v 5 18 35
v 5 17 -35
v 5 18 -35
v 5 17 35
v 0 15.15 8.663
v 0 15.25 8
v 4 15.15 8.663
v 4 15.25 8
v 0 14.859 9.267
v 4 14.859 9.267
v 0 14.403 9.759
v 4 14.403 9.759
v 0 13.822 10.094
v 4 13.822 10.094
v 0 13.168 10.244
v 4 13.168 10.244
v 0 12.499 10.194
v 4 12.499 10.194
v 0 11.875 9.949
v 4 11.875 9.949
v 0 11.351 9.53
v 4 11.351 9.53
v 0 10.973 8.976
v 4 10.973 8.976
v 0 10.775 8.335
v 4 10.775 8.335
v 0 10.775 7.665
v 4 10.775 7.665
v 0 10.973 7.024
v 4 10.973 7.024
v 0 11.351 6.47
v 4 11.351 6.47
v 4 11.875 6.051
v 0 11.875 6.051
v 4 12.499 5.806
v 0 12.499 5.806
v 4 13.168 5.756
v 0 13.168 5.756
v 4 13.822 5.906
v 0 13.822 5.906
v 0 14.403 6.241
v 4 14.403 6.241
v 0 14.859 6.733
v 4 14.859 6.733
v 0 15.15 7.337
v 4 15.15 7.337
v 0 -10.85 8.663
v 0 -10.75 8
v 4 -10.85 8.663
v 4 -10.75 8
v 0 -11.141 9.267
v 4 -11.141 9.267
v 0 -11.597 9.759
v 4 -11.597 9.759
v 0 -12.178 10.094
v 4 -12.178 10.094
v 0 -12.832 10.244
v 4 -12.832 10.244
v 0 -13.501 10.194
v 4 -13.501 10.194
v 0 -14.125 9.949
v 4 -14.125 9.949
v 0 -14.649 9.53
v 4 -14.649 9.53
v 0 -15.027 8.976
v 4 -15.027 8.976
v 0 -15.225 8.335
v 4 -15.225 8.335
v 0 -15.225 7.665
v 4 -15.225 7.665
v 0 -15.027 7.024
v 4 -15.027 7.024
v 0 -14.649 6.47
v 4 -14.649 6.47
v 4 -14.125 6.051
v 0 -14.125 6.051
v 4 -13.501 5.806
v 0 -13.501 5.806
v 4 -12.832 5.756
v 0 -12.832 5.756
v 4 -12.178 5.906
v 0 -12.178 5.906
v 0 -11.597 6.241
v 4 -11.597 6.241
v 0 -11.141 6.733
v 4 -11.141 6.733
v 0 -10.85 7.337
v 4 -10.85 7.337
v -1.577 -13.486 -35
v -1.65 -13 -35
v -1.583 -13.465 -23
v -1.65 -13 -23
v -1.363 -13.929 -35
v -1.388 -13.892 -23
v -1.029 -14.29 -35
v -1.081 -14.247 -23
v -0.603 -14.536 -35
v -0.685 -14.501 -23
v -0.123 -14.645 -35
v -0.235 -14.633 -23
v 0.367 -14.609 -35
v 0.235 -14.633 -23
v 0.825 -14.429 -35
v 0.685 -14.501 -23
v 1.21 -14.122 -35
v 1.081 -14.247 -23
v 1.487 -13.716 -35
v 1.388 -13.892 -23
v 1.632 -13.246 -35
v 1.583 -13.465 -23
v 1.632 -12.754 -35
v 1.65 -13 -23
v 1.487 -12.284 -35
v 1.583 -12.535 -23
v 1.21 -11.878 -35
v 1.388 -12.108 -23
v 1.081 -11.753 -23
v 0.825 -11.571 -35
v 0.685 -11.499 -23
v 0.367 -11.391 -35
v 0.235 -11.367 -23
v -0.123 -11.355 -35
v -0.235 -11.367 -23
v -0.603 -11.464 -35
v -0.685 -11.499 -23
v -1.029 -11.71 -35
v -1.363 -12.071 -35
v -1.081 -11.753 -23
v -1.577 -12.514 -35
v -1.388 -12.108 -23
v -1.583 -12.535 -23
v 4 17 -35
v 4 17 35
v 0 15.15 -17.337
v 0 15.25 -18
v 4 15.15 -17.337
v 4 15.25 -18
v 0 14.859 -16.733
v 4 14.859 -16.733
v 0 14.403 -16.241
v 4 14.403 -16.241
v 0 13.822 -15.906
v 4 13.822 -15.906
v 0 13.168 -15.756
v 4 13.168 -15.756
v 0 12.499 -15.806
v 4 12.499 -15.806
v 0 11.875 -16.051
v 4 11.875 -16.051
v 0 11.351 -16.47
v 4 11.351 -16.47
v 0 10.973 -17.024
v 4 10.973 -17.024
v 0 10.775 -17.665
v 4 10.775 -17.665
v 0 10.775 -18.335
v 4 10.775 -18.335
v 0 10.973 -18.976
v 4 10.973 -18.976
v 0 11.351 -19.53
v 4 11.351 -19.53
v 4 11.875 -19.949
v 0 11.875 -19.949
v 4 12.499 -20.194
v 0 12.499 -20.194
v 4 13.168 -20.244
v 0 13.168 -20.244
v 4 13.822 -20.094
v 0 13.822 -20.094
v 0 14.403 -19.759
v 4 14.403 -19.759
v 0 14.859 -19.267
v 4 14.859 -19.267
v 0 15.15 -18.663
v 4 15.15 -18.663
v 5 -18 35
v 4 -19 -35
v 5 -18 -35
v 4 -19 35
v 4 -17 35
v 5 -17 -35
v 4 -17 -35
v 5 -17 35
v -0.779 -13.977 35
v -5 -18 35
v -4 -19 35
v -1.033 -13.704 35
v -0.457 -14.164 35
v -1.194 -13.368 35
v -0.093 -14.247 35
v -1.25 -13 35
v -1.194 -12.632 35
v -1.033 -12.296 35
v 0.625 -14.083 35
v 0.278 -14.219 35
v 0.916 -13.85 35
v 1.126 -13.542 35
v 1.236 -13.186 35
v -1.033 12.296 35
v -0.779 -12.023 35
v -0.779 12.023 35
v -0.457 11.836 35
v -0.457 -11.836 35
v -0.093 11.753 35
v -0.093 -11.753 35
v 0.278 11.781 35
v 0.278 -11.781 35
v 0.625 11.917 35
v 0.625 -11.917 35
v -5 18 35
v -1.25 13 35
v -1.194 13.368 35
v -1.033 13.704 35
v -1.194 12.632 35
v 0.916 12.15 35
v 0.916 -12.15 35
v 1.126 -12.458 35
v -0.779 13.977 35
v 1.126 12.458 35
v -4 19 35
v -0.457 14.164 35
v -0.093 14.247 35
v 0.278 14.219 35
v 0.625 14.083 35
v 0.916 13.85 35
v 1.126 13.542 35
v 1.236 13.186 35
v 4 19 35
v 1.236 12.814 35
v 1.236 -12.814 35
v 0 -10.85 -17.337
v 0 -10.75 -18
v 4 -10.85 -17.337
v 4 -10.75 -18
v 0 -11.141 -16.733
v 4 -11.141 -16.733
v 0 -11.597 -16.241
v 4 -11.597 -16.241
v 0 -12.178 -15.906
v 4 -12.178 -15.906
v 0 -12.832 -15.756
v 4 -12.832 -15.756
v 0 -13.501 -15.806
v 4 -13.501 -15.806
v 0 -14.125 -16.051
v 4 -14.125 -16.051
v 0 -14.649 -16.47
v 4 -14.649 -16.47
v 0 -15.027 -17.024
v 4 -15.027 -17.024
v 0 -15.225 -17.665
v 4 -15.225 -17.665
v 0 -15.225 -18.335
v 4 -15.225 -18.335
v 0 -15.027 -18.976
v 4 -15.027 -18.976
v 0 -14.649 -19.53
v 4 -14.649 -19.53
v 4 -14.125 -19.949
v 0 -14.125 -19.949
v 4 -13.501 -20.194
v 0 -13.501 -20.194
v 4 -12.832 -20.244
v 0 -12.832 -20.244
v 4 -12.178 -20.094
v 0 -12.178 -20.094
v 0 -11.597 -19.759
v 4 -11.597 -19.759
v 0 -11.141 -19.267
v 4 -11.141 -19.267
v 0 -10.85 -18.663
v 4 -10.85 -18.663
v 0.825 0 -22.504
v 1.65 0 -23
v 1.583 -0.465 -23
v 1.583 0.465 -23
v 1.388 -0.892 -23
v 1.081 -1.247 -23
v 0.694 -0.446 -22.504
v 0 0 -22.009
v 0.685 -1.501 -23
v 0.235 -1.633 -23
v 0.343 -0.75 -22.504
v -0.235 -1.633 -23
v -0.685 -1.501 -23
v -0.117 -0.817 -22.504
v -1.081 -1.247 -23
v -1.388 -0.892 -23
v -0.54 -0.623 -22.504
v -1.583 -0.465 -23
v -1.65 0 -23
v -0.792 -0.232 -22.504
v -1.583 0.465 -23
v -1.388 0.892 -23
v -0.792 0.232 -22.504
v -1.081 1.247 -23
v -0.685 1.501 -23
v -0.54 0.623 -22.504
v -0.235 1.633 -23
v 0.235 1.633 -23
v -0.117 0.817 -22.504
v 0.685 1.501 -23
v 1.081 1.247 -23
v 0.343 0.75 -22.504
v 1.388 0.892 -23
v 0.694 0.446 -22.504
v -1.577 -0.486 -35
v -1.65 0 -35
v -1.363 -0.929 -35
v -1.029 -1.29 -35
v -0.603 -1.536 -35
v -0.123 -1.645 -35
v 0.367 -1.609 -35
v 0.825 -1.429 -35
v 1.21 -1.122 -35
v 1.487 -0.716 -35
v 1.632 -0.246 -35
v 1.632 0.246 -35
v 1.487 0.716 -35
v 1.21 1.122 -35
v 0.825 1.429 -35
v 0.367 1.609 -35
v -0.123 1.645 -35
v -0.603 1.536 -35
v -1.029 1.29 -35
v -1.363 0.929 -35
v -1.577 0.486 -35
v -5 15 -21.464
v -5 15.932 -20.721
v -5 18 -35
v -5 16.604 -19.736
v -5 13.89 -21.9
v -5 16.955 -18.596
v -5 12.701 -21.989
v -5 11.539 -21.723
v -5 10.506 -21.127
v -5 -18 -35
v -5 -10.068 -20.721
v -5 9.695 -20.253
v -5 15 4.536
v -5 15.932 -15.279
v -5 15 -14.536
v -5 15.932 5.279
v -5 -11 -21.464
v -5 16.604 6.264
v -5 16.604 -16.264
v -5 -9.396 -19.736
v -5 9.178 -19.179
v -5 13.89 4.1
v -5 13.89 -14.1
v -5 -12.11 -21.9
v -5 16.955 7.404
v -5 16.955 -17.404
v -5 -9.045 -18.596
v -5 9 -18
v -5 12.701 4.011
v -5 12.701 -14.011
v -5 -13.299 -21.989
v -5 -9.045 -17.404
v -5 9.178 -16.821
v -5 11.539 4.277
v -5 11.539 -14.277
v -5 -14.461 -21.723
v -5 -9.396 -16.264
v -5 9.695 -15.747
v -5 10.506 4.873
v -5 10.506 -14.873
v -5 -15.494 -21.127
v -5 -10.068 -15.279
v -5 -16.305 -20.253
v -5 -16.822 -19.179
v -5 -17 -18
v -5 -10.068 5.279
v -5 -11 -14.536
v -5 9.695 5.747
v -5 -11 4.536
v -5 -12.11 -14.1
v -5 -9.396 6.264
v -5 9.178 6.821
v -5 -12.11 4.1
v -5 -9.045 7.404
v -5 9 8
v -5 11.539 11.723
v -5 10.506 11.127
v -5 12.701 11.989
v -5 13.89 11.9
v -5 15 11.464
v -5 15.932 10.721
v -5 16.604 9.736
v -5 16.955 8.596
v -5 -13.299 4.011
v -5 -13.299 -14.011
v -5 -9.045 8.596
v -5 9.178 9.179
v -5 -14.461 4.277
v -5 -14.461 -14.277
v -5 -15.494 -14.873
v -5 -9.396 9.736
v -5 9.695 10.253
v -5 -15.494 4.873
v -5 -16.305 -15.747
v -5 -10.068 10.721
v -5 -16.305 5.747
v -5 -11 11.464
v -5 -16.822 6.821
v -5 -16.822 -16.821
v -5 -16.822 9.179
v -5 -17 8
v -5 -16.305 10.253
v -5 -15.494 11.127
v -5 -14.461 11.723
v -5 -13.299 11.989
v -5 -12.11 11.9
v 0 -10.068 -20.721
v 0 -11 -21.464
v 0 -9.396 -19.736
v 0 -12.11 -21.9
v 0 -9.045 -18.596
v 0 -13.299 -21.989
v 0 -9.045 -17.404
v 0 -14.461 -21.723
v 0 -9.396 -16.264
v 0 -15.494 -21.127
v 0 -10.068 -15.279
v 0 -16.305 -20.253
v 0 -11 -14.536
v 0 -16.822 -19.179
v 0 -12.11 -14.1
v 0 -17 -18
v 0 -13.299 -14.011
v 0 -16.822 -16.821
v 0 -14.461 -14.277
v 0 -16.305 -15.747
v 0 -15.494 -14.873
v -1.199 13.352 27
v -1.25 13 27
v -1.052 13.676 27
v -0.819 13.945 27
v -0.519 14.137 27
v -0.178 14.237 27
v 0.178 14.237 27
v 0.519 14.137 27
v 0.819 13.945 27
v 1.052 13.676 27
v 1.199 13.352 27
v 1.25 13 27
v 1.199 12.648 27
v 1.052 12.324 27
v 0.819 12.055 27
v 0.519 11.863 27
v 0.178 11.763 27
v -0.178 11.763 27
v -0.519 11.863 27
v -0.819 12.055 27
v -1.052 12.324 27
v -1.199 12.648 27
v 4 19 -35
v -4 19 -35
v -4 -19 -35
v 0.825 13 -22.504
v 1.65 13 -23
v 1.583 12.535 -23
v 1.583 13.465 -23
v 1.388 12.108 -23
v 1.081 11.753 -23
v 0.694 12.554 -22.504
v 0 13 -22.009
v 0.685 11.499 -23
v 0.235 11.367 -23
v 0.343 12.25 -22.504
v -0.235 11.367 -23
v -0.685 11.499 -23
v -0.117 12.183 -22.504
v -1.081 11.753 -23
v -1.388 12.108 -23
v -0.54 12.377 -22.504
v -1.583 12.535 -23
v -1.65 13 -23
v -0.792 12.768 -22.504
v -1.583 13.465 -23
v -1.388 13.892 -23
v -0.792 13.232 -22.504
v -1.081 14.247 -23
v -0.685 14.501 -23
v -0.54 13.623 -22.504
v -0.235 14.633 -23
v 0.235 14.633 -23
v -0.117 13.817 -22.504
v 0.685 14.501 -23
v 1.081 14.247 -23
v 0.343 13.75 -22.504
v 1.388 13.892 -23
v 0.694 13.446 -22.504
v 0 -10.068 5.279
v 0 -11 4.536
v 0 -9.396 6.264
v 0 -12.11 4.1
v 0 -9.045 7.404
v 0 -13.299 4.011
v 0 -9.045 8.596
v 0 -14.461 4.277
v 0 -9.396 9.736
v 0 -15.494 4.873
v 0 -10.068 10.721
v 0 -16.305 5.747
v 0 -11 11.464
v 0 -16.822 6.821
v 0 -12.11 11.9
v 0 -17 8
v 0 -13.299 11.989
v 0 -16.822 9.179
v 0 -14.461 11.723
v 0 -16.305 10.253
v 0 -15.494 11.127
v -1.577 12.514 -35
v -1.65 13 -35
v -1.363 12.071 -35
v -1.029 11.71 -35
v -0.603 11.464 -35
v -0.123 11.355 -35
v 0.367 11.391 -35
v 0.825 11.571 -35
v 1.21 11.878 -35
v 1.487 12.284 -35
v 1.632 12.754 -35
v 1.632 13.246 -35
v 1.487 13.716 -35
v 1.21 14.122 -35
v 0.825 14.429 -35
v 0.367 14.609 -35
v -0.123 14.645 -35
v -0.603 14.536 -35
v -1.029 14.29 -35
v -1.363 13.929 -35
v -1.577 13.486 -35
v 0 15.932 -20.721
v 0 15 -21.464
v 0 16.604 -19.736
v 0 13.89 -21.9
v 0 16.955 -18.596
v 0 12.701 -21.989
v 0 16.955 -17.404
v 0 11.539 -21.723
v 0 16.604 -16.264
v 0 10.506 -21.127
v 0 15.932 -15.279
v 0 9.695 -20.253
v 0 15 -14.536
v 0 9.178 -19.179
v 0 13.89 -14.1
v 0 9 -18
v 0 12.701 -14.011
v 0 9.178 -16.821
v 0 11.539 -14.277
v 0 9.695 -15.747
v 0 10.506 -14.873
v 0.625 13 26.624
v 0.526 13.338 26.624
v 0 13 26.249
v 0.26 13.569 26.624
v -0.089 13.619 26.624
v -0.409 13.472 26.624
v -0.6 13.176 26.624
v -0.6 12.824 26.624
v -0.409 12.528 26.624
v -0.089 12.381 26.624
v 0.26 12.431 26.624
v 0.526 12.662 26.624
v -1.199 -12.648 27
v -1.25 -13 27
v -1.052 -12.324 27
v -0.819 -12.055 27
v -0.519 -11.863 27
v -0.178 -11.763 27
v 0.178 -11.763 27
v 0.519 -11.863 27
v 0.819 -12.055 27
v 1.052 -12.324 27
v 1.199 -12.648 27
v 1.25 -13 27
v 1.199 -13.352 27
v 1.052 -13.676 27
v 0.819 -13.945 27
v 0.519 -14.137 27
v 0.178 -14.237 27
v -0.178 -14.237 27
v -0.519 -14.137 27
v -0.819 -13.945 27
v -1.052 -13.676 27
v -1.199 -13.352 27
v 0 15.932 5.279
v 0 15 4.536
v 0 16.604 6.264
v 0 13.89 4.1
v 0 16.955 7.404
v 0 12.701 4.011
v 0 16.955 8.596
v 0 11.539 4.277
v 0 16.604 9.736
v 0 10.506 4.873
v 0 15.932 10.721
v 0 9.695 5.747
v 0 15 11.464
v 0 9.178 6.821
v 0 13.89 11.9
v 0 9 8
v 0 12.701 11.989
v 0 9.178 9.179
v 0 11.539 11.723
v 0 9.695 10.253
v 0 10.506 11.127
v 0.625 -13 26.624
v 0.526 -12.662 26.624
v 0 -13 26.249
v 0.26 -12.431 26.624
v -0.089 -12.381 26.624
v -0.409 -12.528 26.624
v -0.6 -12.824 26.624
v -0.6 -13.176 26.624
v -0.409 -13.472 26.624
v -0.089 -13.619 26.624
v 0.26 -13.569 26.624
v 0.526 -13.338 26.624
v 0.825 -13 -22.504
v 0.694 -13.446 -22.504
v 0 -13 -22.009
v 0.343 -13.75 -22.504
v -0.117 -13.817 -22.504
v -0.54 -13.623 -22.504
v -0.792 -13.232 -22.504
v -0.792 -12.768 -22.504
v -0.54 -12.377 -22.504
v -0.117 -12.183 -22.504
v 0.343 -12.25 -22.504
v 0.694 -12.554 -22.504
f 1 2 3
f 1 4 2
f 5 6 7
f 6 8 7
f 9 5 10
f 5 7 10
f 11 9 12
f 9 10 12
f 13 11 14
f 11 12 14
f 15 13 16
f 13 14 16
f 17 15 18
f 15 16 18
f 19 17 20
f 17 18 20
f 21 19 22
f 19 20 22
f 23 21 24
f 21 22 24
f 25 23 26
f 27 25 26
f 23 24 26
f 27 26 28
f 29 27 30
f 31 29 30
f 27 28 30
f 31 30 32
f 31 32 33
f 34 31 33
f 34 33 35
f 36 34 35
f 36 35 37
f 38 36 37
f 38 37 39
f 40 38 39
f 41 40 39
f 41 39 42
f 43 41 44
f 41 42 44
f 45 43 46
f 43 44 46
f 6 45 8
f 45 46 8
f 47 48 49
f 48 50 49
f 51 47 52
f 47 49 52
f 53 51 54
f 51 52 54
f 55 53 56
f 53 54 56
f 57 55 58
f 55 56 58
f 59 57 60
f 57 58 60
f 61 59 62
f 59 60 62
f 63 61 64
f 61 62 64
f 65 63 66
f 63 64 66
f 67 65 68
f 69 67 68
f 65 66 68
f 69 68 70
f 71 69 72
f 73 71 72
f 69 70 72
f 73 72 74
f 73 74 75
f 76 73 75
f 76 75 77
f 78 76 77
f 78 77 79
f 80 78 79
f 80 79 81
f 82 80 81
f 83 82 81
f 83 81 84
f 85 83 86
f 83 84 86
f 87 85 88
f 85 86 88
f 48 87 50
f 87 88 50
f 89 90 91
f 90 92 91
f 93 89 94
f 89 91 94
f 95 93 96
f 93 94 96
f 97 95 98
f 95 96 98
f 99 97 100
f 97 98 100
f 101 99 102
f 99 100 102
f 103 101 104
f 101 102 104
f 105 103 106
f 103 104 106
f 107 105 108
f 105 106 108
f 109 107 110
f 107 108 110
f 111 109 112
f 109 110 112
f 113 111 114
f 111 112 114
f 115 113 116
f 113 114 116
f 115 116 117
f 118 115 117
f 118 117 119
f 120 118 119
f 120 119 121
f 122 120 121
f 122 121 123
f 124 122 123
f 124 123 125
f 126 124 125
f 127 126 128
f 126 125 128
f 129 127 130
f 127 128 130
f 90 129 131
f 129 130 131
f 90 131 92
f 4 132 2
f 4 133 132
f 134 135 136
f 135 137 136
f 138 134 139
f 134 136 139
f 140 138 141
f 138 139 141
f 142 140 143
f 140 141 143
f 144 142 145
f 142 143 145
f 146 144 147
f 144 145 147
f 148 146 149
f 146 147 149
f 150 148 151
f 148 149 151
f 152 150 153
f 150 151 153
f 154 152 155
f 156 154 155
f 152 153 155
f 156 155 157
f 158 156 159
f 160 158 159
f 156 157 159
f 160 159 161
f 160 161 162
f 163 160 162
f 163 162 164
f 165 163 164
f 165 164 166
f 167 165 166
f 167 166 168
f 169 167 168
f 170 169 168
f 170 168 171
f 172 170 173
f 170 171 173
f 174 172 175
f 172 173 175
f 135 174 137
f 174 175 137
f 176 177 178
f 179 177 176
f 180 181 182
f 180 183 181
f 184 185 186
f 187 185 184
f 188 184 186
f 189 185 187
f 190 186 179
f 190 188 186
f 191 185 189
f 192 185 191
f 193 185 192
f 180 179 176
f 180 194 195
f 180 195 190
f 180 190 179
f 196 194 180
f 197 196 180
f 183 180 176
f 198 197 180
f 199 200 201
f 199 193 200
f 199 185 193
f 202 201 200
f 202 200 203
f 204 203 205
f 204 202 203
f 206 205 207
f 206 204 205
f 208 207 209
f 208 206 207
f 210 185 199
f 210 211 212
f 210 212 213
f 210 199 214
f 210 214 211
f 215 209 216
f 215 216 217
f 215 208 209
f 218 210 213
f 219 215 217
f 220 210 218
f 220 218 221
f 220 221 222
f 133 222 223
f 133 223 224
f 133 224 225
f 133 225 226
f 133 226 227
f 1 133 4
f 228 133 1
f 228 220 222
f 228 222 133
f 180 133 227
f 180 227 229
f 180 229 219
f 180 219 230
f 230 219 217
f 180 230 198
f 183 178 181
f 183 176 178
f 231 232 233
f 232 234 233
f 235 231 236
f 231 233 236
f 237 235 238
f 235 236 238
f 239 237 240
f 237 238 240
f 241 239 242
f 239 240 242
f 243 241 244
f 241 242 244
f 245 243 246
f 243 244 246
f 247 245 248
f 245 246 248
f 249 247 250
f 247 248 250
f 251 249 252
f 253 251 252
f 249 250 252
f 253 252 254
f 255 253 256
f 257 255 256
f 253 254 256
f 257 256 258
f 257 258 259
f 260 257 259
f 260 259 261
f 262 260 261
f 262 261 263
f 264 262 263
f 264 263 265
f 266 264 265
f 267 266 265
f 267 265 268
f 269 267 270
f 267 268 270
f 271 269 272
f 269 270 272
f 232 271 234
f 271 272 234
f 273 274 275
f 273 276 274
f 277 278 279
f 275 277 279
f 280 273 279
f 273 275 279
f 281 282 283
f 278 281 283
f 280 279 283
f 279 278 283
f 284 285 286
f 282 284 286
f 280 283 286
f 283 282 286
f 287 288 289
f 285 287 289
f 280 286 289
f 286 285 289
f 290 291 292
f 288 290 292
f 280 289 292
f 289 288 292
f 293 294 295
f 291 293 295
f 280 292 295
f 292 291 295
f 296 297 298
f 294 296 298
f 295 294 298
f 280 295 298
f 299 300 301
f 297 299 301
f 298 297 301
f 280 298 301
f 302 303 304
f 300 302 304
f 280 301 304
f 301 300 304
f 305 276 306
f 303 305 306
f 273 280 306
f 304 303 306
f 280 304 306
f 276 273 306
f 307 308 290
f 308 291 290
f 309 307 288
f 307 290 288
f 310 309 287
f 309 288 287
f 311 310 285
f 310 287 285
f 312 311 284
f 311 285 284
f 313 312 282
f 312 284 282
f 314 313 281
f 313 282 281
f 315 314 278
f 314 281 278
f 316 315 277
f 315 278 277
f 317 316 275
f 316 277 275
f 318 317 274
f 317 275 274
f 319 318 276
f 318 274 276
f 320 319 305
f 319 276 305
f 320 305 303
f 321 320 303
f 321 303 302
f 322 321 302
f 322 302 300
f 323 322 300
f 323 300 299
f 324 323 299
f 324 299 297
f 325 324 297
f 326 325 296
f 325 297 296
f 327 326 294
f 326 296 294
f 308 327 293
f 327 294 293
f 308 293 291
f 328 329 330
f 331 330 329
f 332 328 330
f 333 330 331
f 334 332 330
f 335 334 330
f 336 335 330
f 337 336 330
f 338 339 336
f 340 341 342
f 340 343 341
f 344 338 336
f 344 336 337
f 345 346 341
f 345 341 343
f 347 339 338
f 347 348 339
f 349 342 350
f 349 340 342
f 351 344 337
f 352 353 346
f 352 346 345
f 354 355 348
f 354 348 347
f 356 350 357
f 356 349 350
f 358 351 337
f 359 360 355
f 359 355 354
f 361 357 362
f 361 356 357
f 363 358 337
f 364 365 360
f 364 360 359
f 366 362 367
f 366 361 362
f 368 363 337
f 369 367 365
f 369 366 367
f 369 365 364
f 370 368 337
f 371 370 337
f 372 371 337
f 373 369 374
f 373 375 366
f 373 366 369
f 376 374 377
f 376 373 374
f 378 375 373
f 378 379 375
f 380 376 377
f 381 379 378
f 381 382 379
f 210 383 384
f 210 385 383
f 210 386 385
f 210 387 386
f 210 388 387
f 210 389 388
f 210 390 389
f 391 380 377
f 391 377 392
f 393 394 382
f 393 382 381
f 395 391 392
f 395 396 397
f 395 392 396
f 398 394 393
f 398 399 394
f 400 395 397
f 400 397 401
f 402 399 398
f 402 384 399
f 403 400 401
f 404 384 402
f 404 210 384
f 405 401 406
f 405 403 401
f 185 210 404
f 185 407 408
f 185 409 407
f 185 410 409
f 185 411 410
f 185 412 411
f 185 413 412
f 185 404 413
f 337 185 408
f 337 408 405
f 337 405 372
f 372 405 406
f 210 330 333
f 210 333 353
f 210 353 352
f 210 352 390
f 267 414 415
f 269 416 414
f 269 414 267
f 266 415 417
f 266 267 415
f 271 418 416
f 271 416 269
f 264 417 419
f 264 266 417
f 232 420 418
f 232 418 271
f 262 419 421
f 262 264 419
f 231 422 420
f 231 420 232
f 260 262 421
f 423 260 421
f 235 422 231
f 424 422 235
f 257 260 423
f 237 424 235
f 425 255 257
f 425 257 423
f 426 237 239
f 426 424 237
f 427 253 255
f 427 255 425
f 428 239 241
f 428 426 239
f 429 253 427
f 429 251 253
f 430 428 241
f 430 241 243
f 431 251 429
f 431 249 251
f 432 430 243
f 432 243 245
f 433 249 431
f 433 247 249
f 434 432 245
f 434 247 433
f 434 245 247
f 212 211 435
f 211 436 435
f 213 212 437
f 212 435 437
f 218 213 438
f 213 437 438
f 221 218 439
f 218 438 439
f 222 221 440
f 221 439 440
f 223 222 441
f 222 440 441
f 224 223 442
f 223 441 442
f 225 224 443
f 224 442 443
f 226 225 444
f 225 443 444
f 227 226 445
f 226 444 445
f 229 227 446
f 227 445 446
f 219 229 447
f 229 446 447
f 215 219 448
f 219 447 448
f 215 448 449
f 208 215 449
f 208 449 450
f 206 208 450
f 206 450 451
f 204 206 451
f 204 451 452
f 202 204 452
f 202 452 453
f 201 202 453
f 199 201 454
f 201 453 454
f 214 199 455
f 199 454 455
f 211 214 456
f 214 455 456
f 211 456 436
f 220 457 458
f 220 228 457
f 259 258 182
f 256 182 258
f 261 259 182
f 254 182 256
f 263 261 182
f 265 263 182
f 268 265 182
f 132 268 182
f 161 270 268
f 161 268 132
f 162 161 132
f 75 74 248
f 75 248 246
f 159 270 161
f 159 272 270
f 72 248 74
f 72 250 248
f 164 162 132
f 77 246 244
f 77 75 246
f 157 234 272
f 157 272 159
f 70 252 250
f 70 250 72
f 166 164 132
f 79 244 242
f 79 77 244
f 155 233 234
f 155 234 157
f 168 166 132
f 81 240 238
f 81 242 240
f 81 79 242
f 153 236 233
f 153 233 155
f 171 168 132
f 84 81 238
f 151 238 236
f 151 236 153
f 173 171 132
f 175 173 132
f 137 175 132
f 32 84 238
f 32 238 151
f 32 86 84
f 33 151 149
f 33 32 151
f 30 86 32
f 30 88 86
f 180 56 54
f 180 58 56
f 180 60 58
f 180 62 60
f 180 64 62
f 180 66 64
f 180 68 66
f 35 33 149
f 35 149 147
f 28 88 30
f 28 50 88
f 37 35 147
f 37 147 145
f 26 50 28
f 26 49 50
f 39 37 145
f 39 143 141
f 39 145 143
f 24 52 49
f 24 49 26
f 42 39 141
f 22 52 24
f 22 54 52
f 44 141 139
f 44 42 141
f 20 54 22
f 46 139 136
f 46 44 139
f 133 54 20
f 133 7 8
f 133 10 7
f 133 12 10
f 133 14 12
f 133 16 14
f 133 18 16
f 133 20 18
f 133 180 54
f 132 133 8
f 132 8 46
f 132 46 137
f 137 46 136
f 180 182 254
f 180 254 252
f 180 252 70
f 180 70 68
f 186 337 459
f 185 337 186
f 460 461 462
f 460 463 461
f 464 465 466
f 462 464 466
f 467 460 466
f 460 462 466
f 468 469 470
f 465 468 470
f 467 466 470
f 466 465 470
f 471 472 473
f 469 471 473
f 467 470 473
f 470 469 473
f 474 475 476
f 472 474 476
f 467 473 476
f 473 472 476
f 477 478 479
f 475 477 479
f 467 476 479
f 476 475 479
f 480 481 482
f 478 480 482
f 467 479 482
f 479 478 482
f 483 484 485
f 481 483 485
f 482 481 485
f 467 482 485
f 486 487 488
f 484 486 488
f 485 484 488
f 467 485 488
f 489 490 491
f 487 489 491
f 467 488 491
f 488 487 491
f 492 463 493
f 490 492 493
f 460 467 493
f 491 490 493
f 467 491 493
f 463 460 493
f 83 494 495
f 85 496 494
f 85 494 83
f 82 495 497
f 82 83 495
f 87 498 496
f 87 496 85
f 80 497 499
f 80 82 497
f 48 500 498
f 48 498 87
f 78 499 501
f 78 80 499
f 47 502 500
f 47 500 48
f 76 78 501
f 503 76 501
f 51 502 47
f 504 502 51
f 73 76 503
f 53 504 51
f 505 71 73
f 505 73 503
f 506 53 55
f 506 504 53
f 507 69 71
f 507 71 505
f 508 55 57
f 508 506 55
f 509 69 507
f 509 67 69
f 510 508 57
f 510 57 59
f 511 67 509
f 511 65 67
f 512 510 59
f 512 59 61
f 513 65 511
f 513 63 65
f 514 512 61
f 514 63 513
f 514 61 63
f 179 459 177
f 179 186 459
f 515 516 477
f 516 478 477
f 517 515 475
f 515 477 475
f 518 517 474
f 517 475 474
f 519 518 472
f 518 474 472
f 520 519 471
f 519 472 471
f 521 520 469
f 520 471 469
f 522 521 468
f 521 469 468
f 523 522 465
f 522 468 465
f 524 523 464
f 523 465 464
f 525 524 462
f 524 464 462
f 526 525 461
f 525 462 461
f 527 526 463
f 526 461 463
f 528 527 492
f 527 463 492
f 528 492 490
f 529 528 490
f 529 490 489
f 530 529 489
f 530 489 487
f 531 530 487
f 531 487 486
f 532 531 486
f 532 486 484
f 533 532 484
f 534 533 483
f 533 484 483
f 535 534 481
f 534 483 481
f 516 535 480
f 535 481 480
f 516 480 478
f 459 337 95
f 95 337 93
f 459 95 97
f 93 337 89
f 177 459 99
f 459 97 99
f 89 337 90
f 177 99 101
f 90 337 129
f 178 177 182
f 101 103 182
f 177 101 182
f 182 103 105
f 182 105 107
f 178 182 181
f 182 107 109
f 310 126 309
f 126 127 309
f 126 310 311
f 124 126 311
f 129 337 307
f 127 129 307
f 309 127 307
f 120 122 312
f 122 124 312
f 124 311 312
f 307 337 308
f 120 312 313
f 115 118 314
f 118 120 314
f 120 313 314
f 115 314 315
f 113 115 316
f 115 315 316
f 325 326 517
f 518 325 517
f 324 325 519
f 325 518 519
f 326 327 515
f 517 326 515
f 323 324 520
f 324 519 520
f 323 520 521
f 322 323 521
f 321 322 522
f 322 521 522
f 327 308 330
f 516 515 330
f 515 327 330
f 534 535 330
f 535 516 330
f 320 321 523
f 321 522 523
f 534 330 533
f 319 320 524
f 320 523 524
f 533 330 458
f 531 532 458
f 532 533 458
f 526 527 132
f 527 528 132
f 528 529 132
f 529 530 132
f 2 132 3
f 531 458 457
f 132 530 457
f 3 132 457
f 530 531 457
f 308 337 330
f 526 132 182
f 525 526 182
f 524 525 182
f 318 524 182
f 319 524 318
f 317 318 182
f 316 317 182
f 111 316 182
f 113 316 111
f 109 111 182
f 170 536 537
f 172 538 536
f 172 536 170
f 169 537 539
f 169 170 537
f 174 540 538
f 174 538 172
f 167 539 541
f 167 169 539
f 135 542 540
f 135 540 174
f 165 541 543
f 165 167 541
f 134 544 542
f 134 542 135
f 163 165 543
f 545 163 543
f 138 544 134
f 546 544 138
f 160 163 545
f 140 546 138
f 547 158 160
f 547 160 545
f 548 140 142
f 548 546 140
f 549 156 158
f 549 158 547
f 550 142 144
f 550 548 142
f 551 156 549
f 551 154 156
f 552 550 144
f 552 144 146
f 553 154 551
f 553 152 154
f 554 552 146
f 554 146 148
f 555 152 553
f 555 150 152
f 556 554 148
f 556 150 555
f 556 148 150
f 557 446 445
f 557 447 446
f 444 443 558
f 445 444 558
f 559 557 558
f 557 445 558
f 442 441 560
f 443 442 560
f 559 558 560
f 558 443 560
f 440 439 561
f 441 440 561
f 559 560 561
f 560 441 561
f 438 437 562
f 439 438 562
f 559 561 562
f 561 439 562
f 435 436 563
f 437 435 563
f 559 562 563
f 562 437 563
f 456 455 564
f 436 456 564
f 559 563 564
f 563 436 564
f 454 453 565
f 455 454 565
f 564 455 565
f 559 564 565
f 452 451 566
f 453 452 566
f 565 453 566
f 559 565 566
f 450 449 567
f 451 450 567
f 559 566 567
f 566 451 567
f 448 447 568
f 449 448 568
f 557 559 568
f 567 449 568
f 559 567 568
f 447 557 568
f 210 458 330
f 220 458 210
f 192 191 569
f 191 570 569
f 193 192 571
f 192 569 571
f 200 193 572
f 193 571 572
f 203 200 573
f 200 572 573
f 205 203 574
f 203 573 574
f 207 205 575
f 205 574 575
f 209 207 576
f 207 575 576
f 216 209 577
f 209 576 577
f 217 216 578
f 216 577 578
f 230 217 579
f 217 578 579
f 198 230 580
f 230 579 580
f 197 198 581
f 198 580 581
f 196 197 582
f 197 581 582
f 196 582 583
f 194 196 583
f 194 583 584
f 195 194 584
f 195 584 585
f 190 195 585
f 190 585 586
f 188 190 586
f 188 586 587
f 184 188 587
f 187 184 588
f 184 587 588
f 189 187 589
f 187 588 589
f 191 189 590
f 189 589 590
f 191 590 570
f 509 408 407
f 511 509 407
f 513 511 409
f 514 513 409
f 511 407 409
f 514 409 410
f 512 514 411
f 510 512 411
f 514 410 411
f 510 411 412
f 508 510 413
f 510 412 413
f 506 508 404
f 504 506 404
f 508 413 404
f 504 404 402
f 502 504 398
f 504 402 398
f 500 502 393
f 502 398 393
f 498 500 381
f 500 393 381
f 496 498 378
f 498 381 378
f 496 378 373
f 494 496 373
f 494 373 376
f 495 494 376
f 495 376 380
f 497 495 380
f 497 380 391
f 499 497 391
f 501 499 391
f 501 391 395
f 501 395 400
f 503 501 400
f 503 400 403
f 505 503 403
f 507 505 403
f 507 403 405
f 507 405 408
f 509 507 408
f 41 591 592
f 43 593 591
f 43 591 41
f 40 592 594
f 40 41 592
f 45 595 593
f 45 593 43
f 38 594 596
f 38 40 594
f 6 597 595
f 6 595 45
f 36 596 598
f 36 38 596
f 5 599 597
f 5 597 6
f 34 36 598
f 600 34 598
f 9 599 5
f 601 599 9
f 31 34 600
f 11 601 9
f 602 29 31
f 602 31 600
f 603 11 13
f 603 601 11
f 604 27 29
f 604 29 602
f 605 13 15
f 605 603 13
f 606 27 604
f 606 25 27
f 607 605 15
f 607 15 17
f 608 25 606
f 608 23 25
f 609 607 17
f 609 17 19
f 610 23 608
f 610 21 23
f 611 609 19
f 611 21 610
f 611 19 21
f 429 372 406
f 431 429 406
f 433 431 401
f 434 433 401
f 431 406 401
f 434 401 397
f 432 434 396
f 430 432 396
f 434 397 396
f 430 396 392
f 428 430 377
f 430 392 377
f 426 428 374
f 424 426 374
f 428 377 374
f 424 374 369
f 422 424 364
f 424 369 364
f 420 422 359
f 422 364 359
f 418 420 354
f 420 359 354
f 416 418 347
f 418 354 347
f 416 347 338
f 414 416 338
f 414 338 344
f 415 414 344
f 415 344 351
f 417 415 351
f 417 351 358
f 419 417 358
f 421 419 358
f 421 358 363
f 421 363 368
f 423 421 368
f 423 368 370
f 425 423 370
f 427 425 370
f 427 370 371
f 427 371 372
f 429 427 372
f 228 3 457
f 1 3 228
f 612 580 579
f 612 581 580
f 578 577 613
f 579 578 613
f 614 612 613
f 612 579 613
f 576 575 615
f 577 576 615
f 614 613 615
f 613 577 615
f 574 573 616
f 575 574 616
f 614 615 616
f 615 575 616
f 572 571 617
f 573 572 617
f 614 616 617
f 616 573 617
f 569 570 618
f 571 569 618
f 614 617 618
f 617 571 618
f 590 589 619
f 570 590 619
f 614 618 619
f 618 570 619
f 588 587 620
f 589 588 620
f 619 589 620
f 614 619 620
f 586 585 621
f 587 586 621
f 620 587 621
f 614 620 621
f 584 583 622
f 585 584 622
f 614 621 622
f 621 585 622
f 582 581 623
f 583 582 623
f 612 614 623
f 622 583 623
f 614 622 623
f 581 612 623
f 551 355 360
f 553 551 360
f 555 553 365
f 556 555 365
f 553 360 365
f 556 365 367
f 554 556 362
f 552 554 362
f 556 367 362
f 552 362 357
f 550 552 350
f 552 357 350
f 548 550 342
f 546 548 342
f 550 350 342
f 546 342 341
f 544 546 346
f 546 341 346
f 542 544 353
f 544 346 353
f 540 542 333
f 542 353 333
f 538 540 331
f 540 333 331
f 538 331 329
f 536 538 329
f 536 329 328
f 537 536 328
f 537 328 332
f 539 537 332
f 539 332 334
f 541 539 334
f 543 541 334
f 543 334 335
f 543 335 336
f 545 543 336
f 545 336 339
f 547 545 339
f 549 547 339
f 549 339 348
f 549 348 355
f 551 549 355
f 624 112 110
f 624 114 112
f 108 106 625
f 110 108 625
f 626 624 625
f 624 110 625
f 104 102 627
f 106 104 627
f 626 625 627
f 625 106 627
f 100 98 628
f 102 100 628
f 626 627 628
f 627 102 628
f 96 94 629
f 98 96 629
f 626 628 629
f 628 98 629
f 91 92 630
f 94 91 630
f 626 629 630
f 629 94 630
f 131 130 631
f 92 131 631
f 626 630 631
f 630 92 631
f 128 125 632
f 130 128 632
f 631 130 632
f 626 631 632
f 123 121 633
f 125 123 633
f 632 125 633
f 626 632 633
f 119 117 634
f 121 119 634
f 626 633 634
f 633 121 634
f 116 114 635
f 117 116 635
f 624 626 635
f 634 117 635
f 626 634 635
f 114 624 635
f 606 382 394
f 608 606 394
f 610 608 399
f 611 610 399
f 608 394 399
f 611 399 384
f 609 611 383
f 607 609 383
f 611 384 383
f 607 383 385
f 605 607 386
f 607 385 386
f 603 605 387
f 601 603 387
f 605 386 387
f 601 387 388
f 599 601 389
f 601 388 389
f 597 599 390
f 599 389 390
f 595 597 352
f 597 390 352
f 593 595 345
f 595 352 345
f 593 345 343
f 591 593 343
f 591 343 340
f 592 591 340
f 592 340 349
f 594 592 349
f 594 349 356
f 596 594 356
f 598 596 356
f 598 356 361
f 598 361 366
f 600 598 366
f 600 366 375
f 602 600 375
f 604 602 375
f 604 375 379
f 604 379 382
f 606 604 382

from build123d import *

# Parameters (mm, degrees)
F1_DEPTH       = 35
F2_SIZE        = 1
F4_D           = 2.5
F4_DEPTH       = 8
F4_TIP         = 0.7510757738
F6_D           = 4.5
F6_CBORE_D     = 8
F6_CBORE_DEPTH = 5
F8_D           = 3.3
F8_DEPTH       = 12
F8_TIP         = 0.9914200214


with BuildPart() as f1:
    # F0 (on Top) → F1 (new body, symmetric)
    with BuildSketch(Plane.XY):
        Polygon((4, 17), (5, 17), (5, 19), (-5, 19), (-5, -19), (5, -19), (5, -17), (4, -17), (4, 0), align=None)
    extrude(amount=F1_DEPTH, both=True)

    # F2
    f2_edges = [f1.edges().sort_by_distance(p)[0] for p in [
        (-5, 19, 0),
        (5, 19, 0),
        (-5, -19, 0),
        (5, -19, 0),
    ]]
    chamfer(f2_edges, length=F2_SIZE)

    # F4
    with Locations(Plane.XY.offset(35)):
        with Locations((0, 13), (0, -13)):
            Hole(F4_D / 2, depth=F4_DEPTH)
            with Locations((0, 0, -(F4_DEPTH + F4_TIP / 2))):  # 118° drill point
                Cone(0, F4_D / 2, F4_TIP, mode=Mode.SUBTRACT)

    # F6 (through all)
    with Locations(Plane(origin=(-5, 0, 0), x_dir=(0, -1, 0), z_dir=(-1, 0, 0))):
        with Locations((-13, 8), (13, 8), (13, -18), (-13, -18)):
            CounterBoreHole(F6_D / 2, F6_CBORE_D / 2, F6_CBORE_DEPTH)

    # F8
    with Locations(Plane(origin=(0, 0, -35), x_dir=(1, 0, 0), z_dir=(0, 0, -1))):
        with Locations((0, 13), (0, 0), (0, -13)):
            Hole(F8_D / 2, depth=F8_DEPTH)
            with Locations((0, 0, -(F8_DEPTH + F8_TIP / 2))):  # 118° drill point
                Cone(0, F8_D / 2, F8_TIP, mode=Mode.SUBTRACT)


solid = f1.part
